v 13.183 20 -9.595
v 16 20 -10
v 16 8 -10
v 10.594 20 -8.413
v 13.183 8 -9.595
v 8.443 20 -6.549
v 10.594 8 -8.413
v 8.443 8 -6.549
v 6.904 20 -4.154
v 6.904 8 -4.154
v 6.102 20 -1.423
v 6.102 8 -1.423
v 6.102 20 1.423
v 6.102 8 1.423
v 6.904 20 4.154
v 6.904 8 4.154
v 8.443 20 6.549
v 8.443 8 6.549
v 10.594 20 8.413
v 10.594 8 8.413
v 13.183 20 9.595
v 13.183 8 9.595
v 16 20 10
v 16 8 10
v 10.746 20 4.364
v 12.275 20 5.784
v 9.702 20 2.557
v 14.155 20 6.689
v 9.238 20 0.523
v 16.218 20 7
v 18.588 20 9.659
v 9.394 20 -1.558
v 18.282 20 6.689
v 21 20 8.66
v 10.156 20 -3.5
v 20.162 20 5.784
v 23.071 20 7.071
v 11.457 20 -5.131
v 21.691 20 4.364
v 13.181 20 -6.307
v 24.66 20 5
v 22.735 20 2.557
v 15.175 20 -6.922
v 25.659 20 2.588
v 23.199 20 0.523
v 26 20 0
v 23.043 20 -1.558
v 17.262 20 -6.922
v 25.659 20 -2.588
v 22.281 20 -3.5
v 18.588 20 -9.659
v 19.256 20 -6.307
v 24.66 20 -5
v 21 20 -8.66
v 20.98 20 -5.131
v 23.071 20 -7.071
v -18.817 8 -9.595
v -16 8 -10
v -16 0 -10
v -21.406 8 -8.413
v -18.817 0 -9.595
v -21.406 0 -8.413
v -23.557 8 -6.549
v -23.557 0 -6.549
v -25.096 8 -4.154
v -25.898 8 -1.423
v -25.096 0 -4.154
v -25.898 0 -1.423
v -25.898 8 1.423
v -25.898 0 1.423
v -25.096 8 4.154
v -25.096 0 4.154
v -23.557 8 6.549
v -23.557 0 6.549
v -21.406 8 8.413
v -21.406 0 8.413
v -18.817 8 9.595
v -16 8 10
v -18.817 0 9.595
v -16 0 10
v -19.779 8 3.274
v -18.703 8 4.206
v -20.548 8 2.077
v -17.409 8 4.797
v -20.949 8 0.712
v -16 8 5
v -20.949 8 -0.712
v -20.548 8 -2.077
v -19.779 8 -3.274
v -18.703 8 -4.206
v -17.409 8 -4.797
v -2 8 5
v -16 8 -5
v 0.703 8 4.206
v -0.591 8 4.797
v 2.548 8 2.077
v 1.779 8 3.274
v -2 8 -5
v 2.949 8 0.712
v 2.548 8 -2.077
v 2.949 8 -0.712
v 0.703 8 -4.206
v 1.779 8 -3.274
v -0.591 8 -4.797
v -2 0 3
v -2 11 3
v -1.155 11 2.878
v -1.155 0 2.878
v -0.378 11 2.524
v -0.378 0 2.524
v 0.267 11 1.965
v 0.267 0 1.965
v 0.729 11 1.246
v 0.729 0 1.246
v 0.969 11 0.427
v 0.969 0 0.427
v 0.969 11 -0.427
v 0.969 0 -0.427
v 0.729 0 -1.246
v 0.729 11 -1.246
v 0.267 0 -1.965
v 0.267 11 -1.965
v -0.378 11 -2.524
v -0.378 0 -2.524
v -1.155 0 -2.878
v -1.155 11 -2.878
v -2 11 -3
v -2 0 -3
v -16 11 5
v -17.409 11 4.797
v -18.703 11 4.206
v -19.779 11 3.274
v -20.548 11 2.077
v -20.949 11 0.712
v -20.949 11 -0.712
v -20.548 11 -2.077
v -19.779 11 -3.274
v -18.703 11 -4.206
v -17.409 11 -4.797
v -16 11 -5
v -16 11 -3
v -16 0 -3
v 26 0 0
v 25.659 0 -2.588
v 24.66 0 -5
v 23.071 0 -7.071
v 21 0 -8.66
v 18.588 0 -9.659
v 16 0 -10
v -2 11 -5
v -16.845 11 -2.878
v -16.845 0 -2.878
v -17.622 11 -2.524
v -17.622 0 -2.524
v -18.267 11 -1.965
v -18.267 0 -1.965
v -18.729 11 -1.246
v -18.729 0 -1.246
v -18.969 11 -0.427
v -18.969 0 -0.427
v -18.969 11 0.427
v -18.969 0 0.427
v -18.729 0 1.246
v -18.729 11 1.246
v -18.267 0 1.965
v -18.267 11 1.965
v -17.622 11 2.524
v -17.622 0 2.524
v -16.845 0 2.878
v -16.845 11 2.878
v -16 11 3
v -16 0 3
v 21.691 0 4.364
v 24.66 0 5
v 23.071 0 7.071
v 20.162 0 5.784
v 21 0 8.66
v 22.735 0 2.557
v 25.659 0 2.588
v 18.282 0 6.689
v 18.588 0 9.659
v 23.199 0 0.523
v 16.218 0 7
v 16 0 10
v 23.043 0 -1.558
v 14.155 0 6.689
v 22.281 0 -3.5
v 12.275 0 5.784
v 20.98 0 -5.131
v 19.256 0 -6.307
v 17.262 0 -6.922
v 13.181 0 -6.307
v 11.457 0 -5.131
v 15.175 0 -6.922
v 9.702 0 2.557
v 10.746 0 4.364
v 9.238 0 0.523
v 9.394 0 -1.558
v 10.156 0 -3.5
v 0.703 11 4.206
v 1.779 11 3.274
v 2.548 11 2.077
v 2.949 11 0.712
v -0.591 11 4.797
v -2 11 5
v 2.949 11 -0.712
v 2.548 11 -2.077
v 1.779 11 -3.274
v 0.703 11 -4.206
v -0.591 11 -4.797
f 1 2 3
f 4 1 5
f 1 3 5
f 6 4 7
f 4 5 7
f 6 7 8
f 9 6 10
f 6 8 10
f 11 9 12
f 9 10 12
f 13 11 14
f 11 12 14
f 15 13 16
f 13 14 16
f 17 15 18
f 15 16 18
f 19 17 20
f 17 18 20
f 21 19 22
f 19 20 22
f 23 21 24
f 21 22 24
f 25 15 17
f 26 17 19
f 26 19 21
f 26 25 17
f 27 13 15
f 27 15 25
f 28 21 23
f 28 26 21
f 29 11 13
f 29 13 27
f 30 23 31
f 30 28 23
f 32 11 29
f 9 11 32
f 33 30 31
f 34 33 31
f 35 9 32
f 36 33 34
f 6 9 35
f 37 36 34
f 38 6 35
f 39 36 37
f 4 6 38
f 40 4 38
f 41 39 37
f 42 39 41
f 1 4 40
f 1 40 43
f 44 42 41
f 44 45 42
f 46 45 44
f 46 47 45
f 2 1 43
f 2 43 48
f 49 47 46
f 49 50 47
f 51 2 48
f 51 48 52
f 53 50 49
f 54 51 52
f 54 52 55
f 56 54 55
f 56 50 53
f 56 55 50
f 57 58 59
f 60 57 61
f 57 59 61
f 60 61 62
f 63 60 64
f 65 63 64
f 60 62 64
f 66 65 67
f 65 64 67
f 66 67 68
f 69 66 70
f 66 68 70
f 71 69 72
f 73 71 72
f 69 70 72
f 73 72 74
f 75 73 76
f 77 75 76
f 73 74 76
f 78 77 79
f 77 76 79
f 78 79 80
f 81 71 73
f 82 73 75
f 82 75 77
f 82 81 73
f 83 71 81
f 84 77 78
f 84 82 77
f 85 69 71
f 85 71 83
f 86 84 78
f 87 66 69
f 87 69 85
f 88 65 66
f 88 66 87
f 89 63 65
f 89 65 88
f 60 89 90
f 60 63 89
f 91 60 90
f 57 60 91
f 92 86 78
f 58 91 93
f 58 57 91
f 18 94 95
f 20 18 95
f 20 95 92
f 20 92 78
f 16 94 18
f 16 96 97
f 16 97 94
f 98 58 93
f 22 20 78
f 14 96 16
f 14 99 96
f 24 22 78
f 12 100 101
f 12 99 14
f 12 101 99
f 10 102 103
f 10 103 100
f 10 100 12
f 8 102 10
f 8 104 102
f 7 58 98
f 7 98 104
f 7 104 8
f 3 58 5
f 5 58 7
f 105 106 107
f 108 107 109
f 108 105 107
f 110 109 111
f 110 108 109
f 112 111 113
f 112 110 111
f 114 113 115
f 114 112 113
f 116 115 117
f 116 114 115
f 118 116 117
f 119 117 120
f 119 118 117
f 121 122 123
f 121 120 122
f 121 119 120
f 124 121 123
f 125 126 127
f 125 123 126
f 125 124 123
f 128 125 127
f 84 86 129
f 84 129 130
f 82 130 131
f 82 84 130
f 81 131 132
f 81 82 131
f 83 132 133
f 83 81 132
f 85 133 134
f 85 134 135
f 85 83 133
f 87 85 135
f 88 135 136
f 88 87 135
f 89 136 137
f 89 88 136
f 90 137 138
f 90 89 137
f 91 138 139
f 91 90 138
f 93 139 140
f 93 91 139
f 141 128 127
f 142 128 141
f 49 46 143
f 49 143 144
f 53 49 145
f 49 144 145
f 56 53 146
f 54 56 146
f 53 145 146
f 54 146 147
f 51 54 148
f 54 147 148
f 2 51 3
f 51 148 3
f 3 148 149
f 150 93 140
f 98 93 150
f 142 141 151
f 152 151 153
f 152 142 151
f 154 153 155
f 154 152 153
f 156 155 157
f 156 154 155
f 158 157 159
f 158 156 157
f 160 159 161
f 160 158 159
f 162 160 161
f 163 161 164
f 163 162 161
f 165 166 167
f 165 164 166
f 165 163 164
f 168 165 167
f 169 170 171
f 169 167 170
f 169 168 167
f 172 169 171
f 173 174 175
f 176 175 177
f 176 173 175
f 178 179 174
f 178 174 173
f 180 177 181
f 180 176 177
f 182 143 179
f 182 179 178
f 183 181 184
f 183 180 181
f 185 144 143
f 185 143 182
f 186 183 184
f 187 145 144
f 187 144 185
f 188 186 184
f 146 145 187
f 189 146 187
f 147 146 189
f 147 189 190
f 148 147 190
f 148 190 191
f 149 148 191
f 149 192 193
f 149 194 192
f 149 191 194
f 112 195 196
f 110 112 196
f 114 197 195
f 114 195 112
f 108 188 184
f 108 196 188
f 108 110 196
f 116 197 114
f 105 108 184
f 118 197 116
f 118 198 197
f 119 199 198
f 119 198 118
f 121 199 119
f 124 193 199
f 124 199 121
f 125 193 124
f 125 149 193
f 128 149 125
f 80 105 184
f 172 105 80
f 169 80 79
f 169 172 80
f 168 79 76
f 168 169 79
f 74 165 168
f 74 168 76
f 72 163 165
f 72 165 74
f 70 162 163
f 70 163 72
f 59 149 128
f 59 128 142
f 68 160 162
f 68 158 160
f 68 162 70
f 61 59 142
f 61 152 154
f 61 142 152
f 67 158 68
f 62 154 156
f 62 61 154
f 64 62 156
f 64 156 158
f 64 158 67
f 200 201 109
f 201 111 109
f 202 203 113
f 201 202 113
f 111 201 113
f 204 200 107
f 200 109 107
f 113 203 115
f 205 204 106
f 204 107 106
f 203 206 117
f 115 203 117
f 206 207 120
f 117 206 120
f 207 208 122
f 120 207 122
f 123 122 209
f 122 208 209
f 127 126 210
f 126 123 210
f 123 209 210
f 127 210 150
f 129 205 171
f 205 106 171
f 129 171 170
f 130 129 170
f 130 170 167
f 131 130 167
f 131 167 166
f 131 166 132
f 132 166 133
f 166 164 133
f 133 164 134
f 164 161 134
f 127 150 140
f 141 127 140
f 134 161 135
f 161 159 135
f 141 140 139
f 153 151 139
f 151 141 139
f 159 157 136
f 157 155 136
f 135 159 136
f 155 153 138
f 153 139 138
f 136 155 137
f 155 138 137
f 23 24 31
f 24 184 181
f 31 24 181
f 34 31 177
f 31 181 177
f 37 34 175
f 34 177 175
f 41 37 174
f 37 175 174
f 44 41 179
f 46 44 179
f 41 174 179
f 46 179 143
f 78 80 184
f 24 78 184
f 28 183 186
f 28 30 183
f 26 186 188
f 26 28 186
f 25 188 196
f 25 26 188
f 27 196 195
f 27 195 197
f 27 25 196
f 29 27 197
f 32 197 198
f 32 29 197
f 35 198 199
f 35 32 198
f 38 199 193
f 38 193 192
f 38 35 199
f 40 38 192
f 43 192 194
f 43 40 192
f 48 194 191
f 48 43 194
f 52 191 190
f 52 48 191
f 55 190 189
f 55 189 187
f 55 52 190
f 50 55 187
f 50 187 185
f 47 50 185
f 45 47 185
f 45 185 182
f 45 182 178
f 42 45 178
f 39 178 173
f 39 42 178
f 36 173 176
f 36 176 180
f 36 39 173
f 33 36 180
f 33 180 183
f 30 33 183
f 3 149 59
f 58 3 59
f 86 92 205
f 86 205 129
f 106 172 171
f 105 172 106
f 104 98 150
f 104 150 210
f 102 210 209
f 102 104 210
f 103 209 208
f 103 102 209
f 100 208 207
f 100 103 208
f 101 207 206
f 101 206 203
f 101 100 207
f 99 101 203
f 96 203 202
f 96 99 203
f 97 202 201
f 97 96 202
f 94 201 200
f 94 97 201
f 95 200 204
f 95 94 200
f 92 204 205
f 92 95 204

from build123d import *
from build123d.topology import SkipClean

# Parameters (mm, degrees)
EXTRUDE_1_DEPTH          = 20
EXTRUDE_2_DEPTH          = 8
EXTRUDE_3_DEPTH          = 11
CUT_EXTRUDE_7_DEPTH      = 35.292856399
CUT_EXTRUDE_7_DEPTH_BACK = 35.292856399


with BuildPart() as part:
    # 草图2 → 凸台-拉伸1 (new body)
    with BuildSketch(Plane(origin=(0, 0, 0), x_dir=(1, 0, 0), z_dir=(0, 1, 0))):
        with BuildLine():
            ThreePointArc((26, 0), (23.071067812, 7.071067812), (16, 10))
            ThreePointArc((16, 10), (6, 0), (16, -10))
            ThreePointArc((16, -10), (23.071067812, -7.071067812), (26, 0))
        make_face()
    extrude(amount=EXTRUDE_1_DEPTH)

    # 草图2<3> → 凸台-拉伸2 (add)
    with BuildSketch(Plane(origin=(0, 0, 0), x_dir=(1, 0, 0), z_dir=(0, 1, 0))):
        with BuildLine():
            Line((16, 10), (-16, 10))
            ThreePointArc((-16, 10), (-26, 0), (-16, -10))
            Line((-16, -10), (16, -10))
            ThreePointArc((16, -10), (6, 0), (16, 10))
        make_face()
    extrude(amount=EXTRUDE_2_DEPTH)

    # 草图7 → 凸台-拉伸3 (add)
    with BuildSketch(Plane(origin=(0, 0, 0), x_dir=(1, 0, 0), z_dir=(0, 1, 0))):
        with BuildLine():
            Line((-16, 5), (-2, 5))
            ThreePointArc((-2, 5), (3, 0), (-2, -5))
            Line((-2, -5), (-16, -5))
            ThreePointArc((-16, -5), (-21, 0), (-16, 5))
        make_face()
        with BuildLine():
            Line((-16, 3), (-2, 3))
            ThreePointArc((-2, 3), (1, 0), (-2, -3))
            Line((-2, -3), (-16, -3))
            ThreePointArc((-16, -3), (-19, 0), (-16, 3))
        make_face(mode=Mode.SUBTRACT)
    extrude(amount=EXTRUDE_3_DEPTH)

    # 草图7<6> → 切除-拉伸7 (cut, two sides: drawn at the far end of the back side and taken through both)
    with SkipClean():  # the faces are left unmerged after this step: merging them gives an invalid solid
        with BuildSketch(Plane(origin=(0, 0, 0), x_dir=(1, 0, 0), z_dir=(0, 1, 0)).offset(-CUT_EXTRUDE_7_DEPTH_BACK)):
            with BuildLine():
                Line((-16, -3), (-2, -3))
                ThreePointArc((-2, -3), (1, 0), (-2, 3))
                Line((-2, 3), (-16, 3))
                ThreePointArc((-16, 3), (-19, 0), (-16, -3))
            make_face()
        extrude(amount=CUT_EXTRUDE_7_DEPTH + CUT_EXTRUDE_7_DEPTH_BACK, mode=Mode.SUBTRACT)
    add(part.part.scale(1), mode=Mode.REPLACE)  # the faces are merged on a copy

    # 草图13 → Ø1.0mm 暗销孔1 (revolve, cut)
    with BuildSketch(Plane(origin=(16.218423998, 20, 0), x_dir=(0, 0, 1), z_dir=(1, 0, 0))):
        Polygon((0, 0), (0, 20), (7, 20), (7, 0), (0.525, 0), align=None)
    revolve(axis=Axis((16.218423998, 26.35, 0), (0, -1, 0)), mode=Mode.SUBTRACT)


solid = part.part
